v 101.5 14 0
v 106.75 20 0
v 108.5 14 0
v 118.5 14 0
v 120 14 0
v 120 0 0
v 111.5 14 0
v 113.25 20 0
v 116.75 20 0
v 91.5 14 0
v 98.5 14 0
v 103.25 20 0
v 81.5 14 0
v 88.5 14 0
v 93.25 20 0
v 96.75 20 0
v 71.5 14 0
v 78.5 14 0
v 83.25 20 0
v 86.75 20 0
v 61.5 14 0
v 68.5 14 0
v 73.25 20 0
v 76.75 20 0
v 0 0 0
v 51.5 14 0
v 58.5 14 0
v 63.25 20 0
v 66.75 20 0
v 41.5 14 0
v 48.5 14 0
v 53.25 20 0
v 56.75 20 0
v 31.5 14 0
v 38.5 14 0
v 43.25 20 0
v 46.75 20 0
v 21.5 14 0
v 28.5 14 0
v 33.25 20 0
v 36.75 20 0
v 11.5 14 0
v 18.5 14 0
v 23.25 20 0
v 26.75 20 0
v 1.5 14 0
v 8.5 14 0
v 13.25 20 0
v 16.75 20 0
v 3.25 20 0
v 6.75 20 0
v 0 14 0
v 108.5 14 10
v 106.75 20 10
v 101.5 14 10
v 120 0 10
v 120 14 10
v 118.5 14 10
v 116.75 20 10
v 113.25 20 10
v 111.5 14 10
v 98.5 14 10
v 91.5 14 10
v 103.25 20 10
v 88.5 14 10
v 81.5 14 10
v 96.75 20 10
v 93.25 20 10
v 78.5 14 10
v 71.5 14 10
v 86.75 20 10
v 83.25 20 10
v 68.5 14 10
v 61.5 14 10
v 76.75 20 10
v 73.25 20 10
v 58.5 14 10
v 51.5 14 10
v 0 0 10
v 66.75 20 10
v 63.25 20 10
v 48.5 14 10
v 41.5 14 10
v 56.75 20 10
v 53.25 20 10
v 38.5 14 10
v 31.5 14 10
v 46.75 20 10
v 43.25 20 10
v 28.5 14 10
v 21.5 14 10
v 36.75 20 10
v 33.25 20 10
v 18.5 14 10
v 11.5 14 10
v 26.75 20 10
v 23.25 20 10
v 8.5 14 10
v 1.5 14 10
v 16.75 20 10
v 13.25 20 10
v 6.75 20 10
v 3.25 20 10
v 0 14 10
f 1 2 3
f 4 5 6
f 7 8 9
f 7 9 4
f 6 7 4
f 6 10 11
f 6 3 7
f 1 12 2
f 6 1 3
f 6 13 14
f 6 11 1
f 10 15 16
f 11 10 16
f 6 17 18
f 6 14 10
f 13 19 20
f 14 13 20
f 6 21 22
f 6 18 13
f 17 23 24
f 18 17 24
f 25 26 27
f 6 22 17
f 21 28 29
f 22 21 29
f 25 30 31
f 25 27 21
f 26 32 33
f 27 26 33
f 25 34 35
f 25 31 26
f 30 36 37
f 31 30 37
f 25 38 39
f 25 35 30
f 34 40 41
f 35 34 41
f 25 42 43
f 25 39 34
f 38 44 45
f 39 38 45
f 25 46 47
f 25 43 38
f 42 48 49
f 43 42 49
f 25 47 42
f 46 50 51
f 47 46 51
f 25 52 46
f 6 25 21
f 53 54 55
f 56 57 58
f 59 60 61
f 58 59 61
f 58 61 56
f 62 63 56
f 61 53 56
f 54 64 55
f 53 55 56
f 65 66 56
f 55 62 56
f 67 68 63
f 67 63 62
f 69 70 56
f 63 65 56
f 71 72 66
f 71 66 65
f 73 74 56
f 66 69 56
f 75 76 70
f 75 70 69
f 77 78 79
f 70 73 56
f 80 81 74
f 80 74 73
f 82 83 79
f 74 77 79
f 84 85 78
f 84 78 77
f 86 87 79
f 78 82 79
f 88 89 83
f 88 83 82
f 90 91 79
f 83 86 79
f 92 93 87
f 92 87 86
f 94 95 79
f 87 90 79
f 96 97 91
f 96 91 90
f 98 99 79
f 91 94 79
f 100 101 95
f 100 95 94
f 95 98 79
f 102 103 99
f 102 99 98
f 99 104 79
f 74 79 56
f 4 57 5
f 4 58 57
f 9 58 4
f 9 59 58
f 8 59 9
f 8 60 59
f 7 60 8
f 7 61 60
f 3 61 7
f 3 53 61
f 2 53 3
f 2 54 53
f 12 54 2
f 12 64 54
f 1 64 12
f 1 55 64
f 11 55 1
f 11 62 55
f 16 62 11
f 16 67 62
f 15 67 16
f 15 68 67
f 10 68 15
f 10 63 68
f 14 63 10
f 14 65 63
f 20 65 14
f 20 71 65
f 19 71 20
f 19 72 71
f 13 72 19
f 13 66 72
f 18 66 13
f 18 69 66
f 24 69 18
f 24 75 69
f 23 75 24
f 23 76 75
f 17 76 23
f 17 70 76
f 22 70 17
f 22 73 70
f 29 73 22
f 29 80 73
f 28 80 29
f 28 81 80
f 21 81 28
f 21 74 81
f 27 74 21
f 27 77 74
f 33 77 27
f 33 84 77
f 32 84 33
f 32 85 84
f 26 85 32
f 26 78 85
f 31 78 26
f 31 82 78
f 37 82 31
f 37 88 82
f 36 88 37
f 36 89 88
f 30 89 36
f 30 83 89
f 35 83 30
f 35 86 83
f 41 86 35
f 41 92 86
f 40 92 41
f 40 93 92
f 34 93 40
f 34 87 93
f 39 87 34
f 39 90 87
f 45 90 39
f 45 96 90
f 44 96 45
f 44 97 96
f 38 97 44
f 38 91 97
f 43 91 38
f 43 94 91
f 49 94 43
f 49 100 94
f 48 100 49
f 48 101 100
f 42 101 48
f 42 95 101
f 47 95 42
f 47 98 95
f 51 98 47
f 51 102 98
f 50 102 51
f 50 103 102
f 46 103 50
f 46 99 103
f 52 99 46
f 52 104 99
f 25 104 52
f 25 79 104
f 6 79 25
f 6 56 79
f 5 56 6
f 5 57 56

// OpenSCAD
$fn = 32;

// ----------------------------------------------------------------------
// Gear rack: 12 teeth, pitch 10 mm
// ----------------------------------------------------------------------

// --- parameters (mm) ---
teeth = 12;               // number of teeth
pitch = 10;               // tooth pitch, X
root_w = 7;               // tooth width at the root
tip_w = 3.5;              // tooth width at the tip
base_h = 14;              // rack body height, Y
tooth_h = 6;              // tooth height above the body
plate_t = 10;             // rack width, Z (extrusion height)

rack_l = teeth * pitch;  // overall length
total_h = base_h + tooth_h;  // overall height

profile = [[0, 0], [120, 0], [120, 14], [118.5, 14], [116.75, 20], [113.25, 20], [111.5, 14], [108.5, 14], [106.75, 20], [103.25, 20], [101.5, 14], [98.5, 14], [96.75, 20], [93.25, 20], [91.5, 14], [88.5, 14], [86.75, 20], [83.25, 20], [81.5, 14], [78.5, 14], [76.75, 20], [73.25, 20], [71.5, 14], [68.5, 14], [66.75, 20], [63.25, 20], [61.5, 14], [58.5, 14], [56.75, 20], [53.25, 20], [51.5, 14], [48.5, 14], [46.75, 20], [43.25, 20], [41.5, 14], [38.5, 14], [36.75, 20], [33.25, 20], [31.5, 14], [28.5, 14], [26.75, 20], [23.25, 20], [21.5, 14], [18.5, 14], [16.75, 20], [13.25, 20], [11.5, 14], [8.5, 14], [6.75, 20], [3.25, 20], [1.5, 14], [0, 14]];  // primary outline, 52 points, counter clockwise

// --- the one profile operation ---
linear_extrude(height = plate_t) polygon(points = profile);
